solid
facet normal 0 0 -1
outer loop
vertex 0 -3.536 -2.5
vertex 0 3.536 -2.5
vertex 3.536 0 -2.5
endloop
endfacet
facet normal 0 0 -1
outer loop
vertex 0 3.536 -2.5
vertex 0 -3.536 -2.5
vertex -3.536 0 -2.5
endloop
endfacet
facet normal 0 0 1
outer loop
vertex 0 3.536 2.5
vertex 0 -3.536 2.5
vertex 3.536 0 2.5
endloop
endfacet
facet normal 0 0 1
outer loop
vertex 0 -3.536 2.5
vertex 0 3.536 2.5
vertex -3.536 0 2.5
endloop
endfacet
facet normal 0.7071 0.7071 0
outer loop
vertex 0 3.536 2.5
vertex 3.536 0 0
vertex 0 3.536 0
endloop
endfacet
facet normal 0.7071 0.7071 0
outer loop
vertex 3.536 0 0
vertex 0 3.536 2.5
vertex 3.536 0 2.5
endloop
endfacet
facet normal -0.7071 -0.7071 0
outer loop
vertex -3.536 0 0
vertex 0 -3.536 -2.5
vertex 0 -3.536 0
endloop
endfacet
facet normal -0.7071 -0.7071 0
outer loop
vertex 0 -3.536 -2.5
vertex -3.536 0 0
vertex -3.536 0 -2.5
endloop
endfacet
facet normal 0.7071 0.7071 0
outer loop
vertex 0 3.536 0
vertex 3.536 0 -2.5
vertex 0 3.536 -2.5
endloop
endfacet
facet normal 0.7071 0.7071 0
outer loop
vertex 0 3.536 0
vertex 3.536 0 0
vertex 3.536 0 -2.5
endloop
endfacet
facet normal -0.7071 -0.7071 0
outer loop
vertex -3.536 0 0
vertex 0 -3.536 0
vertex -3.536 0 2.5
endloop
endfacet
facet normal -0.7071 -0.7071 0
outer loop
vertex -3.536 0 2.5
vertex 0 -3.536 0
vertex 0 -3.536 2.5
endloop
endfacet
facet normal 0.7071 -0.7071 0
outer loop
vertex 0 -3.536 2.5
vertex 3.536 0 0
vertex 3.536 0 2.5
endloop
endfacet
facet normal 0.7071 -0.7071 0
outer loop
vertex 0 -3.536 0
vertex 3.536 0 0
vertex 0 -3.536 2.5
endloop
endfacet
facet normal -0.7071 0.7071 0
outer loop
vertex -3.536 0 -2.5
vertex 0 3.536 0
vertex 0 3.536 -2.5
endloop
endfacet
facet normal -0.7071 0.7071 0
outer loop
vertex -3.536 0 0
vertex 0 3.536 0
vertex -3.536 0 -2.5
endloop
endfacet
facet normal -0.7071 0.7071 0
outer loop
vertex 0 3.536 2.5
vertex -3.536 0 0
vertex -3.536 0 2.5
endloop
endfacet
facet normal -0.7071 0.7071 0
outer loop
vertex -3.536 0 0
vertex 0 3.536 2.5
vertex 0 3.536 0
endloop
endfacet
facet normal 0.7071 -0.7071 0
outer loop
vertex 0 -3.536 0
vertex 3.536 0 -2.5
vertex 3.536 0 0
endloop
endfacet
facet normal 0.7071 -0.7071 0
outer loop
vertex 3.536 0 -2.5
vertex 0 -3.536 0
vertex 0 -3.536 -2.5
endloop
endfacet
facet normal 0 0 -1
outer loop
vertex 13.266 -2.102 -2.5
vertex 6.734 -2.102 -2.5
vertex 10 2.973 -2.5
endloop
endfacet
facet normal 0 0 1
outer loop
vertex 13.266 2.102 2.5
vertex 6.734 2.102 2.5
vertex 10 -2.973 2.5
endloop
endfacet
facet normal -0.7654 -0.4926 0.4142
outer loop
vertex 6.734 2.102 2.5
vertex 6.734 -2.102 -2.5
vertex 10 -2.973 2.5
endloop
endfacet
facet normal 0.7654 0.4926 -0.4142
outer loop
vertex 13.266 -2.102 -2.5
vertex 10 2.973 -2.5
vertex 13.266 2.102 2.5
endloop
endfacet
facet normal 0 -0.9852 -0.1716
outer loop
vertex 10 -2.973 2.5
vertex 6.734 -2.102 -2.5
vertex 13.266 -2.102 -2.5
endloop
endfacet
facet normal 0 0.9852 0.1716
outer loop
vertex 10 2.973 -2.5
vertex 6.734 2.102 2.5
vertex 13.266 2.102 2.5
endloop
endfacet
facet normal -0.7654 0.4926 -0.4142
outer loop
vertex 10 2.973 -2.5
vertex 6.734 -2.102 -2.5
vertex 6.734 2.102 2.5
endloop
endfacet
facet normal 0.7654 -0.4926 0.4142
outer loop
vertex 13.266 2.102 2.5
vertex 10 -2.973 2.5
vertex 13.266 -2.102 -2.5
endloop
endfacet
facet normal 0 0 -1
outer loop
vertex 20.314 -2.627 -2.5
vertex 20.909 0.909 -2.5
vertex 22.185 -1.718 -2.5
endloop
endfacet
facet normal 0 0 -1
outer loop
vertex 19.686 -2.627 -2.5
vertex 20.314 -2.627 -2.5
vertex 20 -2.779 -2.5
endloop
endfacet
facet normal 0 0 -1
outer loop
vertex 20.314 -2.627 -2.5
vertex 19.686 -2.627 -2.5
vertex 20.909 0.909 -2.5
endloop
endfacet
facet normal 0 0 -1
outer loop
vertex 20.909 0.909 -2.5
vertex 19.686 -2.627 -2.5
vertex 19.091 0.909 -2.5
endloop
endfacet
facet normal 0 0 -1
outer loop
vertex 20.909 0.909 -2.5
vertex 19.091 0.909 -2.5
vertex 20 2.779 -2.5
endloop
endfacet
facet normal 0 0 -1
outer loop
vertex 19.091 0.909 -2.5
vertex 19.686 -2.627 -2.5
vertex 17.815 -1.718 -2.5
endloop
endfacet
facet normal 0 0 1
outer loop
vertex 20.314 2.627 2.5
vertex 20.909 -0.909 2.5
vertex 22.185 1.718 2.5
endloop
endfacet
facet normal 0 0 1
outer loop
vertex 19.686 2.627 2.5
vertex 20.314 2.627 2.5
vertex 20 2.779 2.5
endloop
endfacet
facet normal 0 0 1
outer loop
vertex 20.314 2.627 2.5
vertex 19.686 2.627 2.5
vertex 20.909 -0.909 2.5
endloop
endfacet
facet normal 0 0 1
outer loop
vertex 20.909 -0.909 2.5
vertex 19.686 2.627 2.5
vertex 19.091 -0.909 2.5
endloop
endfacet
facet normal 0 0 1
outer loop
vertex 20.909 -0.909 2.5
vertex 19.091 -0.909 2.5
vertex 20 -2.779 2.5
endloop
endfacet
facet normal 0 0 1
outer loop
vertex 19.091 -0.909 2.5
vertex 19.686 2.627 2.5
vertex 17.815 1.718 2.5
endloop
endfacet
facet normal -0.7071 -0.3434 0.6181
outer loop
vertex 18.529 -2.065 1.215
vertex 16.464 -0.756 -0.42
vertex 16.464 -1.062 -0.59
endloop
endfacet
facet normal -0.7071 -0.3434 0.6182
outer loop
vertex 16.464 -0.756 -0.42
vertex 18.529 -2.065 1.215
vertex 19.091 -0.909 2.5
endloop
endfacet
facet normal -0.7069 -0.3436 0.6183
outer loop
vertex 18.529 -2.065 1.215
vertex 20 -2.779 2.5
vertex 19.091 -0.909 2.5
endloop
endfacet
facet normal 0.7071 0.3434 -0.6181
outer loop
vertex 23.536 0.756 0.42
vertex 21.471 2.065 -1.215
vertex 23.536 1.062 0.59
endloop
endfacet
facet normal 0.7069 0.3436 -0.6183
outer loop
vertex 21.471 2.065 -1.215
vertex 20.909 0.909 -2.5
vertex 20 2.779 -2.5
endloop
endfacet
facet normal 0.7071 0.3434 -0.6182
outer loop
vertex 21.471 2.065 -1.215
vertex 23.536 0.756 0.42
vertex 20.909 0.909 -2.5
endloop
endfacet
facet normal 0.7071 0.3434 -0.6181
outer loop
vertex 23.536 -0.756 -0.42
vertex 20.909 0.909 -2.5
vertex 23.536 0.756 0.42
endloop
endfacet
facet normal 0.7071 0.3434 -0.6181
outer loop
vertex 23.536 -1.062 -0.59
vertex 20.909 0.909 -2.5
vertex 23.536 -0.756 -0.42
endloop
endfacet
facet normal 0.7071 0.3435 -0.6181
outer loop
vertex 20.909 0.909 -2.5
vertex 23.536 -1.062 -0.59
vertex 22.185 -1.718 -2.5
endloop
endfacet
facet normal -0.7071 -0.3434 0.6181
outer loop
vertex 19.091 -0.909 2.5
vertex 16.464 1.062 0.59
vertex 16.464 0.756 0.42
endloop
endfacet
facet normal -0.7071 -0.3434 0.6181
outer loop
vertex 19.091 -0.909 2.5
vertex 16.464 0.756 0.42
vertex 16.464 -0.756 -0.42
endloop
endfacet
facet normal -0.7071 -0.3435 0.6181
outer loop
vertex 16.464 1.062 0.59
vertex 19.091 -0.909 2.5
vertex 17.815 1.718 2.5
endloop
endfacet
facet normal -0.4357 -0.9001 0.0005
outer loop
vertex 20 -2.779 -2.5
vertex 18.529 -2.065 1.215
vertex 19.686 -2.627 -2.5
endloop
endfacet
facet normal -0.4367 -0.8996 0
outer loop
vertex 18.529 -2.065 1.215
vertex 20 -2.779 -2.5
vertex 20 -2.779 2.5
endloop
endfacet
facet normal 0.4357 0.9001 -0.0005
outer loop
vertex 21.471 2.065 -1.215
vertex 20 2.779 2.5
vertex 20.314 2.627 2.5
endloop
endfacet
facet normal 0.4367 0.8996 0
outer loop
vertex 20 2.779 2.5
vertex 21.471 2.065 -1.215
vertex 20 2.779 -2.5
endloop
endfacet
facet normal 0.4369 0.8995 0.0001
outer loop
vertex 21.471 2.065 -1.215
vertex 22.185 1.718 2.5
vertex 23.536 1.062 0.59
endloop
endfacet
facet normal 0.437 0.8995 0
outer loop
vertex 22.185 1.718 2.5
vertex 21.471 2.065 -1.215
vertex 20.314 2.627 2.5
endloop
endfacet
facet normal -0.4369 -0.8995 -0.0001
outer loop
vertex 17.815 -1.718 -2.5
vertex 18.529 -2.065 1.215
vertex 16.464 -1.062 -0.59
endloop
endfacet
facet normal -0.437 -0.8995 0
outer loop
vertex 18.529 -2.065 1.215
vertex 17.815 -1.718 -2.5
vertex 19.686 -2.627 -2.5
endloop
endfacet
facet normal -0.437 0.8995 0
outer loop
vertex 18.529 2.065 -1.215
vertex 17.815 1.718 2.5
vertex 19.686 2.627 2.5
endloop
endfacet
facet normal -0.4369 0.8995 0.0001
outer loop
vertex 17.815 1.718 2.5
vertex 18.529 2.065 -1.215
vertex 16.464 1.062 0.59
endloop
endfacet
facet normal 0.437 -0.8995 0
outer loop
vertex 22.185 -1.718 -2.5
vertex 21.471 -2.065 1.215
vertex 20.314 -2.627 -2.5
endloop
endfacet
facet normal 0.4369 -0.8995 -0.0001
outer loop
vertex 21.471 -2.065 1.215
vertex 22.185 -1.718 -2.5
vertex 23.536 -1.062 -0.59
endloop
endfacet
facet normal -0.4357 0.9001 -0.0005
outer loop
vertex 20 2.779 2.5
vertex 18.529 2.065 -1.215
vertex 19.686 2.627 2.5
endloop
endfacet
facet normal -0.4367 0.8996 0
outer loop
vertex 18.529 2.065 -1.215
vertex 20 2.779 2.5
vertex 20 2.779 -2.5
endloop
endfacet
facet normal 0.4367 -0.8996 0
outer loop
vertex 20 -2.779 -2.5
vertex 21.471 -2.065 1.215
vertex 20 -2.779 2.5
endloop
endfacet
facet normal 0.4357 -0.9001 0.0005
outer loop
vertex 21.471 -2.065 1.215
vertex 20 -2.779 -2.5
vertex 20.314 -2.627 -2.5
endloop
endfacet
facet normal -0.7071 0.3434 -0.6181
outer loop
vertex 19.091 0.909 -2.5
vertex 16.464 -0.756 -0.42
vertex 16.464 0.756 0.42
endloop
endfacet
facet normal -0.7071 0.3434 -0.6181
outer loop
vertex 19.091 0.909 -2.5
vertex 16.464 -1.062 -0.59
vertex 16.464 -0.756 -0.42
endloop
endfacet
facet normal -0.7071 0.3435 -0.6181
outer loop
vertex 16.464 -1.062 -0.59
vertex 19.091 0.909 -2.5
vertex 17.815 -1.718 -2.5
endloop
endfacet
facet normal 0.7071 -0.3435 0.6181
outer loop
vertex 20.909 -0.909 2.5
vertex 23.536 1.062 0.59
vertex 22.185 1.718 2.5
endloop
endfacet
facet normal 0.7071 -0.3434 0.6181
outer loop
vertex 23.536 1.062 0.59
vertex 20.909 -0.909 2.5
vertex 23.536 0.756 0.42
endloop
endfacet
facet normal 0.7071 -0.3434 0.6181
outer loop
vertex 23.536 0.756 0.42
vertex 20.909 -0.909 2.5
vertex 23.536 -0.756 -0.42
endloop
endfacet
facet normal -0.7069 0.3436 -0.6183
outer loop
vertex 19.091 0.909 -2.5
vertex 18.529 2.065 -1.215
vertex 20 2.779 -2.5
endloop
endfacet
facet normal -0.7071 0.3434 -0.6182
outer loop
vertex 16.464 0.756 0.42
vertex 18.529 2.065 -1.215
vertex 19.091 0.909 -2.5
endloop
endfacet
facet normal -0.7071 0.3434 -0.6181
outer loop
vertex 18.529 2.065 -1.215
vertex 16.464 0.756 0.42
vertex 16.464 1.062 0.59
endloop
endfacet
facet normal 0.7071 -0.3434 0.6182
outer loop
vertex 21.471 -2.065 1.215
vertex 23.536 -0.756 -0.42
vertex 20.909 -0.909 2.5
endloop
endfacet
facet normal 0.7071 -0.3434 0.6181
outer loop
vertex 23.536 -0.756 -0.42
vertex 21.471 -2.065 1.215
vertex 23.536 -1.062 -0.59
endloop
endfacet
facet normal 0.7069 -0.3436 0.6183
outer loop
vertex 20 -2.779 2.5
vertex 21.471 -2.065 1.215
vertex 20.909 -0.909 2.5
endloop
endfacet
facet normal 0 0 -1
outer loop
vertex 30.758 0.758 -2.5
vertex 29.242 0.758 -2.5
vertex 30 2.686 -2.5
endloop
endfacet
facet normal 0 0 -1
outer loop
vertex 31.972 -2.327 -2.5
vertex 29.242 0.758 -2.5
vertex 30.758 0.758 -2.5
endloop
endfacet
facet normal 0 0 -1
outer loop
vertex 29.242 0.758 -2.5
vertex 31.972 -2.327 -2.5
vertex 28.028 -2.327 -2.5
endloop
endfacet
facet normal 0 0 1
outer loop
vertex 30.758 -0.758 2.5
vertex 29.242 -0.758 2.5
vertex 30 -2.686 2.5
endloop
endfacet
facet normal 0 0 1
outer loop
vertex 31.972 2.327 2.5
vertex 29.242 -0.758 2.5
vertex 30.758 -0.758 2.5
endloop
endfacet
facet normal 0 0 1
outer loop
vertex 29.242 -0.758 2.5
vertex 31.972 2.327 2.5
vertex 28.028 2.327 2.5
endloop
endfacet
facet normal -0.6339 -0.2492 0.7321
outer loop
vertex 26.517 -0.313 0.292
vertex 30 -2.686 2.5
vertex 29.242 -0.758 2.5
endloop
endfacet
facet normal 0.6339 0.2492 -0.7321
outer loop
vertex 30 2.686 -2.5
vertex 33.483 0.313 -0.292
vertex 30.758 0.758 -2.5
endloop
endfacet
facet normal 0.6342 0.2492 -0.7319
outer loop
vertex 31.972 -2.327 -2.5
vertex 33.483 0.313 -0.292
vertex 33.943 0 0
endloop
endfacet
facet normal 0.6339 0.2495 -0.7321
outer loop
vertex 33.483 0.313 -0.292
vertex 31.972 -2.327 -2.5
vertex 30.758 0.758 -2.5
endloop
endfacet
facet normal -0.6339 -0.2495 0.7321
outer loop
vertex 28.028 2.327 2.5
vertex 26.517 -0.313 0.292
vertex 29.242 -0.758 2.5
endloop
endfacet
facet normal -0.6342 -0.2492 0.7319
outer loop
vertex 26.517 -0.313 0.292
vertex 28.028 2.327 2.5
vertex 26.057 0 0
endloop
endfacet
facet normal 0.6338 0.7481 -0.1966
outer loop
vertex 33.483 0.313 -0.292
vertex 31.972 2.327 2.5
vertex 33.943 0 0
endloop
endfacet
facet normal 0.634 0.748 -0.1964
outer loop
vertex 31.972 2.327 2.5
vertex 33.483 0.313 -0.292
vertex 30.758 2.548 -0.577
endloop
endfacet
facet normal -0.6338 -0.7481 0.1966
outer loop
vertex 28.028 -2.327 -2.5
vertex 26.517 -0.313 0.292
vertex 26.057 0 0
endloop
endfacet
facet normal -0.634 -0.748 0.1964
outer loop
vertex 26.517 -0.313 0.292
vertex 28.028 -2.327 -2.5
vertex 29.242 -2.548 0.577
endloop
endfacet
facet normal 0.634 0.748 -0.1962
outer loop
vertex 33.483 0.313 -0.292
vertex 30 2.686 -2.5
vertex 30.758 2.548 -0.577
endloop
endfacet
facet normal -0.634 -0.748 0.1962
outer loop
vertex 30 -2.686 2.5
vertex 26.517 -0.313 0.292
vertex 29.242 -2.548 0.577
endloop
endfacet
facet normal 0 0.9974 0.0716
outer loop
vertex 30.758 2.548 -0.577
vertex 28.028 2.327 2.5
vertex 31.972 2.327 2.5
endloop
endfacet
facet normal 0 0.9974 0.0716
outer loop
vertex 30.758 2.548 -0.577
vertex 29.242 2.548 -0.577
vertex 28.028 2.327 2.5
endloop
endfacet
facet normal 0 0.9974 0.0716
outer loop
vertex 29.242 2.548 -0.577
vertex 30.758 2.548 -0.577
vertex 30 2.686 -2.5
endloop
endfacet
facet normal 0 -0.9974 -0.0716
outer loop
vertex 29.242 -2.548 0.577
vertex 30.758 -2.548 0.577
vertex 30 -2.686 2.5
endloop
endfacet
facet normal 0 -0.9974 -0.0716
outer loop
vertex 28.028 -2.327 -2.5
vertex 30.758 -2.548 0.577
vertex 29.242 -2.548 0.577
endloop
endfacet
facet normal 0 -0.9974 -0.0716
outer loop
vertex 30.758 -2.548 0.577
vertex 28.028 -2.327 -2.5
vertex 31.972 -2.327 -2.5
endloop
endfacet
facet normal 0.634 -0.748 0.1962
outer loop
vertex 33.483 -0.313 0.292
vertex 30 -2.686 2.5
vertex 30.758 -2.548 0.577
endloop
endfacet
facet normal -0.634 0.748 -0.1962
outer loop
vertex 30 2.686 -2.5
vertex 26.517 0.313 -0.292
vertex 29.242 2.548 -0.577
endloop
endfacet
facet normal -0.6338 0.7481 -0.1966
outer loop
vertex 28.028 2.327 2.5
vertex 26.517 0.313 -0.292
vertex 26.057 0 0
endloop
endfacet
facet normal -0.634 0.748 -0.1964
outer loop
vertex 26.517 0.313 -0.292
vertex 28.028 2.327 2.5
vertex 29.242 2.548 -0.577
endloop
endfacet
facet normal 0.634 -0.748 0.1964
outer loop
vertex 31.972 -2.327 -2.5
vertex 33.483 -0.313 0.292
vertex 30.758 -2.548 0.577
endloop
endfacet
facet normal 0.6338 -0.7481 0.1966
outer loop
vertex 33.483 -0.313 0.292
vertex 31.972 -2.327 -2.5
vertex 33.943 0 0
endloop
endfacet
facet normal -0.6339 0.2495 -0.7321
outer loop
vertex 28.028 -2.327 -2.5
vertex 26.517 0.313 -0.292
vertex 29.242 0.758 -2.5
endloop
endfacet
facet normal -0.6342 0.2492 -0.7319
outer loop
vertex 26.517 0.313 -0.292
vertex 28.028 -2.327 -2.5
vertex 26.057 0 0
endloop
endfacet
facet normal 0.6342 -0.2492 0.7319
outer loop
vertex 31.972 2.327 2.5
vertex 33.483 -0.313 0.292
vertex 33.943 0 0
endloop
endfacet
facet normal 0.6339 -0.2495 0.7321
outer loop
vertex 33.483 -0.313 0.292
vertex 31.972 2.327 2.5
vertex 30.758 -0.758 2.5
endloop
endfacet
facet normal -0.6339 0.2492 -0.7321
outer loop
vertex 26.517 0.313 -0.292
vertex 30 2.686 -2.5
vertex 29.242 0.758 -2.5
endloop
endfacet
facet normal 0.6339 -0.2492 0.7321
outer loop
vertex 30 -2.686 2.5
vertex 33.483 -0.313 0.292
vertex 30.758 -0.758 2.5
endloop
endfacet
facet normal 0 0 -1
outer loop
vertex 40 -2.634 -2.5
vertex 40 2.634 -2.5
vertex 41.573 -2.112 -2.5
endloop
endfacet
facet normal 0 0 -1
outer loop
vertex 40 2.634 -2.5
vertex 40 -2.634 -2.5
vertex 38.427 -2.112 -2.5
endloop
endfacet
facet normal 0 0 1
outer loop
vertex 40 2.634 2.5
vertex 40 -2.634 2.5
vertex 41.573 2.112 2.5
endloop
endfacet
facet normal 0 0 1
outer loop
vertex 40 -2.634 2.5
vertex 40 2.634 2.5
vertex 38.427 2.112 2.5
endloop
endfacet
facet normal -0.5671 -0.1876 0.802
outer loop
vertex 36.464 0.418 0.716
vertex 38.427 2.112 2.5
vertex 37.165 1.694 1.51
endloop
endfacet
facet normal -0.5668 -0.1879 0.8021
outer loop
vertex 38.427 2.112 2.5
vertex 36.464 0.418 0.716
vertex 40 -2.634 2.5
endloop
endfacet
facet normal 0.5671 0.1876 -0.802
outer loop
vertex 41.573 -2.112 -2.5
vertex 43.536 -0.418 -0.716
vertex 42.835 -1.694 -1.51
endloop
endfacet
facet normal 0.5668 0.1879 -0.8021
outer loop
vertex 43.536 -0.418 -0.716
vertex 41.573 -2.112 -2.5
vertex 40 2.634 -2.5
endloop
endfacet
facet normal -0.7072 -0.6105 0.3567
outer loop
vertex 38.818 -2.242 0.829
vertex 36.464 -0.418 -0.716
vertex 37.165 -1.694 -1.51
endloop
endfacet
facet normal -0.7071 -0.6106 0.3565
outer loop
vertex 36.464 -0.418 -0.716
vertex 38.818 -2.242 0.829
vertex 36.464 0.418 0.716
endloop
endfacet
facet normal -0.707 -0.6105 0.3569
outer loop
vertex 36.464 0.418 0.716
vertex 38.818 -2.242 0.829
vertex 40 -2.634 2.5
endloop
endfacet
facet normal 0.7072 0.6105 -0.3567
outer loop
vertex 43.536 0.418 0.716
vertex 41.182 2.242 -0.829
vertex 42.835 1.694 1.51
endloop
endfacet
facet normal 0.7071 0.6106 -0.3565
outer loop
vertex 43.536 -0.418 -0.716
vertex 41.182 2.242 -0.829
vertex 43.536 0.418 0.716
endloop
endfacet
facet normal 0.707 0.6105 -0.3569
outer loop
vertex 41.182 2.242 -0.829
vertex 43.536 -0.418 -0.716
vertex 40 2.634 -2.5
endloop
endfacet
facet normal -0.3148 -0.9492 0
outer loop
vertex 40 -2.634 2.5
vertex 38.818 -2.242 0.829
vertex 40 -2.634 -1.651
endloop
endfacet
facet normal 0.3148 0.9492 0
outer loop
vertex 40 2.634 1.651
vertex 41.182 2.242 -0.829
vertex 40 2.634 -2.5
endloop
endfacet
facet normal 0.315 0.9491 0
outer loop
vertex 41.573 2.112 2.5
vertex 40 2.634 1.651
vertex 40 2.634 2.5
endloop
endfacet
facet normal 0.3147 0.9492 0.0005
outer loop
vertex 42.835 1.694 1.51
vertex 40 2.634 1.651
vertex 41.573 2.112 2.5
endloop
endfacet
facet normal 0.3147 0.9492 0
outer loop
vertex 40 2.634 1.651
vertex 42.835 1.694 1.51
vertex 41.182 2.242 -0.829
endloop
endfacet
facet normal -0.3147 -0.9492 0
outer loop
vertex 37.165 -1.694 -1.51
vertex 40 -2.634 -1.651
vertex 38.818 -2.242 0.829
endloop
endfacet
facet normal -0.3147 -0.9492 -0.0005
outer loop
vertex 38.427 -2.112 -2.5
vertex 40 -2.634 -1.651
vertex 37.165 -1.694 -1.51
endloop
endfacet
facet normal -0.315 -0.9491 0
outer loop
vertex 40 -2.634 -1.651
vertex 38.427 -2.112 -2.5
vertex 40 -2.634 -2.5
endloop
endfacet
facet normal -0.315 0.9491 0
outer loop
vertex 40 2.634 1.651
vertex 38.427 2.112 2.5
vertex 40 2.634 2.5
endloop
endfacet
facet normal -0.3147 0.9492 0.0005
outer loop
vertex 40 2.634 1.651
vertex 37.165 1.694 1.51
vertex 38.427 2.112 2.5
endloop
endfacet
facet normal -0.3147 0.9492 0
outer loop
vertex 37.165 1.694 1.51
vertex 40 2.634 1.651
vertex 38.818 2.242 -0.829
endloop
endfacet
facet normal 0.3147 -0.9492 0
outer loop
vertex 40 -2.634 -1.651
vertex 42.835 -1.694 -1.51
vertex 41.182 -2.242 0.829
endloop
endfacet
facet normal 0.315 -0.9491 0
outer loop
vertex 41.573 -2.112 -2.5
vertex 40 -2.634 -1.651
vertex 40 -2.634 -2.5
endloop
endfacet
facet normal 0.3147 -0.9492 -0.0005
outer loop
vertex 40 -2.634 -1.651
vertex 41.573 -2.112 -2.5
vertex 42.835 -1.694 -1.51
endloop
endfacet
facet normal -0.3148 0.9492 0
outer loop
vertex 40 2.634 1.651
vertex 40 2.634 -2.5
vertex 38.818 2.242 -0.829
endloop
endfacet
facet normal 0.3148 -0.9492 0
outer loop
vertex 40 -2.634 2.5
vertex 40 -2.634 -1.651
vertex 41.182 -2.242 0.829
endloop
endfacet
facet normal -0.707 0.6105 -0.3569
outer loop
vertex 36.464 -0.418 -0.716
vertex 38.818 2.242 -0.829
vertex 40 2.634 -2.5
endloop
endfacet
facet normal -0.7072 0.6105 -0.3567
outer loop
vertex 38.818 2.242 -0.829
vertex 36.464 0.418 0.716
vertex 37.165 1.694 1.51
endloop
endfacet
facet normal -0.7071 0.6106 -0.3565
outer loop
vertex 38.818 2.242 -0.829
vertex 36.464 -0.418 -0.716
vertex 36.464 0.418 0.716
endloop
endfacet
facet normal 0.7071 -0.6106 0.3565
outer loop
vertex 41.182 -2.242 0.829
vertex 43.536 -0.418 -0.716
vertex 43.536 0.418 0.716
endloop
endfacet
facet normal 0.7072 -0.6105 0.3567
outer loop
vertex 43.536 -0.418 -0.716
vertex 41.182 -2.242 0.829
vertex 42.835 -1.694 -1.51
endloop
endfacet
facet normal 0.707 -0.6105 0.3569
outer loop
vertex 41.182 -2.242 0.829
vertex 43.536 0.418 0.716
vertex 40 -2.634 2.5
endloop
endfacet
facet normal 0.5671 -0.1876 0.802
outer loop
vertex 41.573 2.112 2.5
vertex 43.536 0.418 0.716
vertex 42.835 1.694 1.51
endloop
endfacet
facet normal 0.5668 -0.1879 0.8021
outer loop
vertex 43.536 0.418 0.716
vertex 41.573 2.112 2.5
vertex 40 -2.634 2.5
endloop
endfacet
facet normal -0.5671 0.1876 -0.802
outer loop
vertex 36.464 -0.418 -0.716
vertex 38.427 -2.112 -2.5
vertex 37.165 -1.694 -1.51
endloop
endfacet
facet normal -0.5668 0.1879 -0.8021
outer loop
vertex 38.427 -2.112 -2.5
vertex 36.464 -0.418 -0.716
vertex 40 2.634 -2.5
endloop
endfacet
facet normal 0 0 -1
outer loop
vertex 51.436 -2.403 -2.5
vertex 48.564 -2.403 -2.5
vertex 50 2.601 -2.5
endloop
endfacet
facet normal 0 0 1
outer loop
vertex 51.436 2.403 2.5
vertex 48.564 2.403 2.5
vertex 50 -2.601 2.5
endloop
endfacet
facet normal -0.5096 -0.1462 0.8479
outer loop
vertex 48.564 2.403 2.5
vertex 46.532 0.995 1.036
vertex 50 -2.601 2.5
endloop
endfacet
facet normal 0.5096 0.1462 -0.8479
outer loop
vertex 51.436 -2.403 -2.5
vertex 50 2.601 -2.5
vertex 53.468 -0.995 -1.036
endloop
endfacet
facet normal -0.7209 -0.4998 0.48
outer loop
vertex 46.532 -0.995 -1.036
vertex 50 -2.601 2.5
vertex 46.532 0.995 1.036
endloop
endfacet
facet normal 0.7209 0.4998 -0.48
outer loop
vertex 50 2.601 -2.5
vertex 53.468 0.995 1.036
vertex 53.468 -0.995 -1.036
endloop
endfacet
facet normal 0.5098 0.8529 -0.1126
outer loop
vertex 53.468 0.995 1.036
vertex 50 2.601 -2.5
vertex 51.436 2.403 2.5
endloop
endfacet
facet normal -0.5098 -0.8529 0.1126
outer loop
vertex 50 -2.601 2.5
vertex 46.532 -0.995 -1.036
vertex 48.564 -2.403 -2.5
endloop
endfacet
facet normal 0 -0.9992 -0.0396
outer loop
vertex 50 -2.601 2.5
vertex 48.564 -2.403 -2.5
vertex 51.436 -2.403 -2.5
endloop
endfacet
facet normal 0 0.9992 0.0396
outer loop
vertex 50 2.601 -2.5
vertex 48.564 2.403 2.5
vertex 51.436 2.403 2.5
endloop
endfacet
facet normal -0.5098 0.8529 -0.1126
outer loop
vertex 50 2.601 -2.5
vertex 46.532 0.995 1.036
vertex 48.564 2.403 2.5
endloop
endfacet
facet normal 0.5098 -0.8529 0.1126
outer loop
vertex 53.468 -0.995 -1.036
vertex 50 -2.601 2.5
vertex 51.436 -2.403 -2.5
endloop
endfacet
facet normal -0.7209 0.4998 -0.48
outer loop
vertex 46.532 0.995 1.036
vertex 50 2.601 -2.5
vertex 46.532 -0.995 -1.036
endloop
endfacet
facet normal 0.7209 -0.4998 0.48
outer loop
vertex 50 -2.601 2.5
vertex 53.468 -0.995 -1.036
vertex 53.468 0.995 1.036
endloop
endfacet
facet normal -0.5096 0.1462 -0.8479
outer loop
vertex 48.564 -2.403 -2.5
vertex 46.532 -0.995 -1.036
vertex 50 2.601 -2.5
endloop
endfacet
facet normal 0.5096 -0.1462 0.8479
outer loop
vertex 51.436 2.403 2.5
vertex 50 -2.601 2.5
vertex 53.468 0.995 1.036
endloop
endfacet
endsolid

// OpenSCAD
// 2 * 5 = 10面体骰子
module item(w=10,d=45,p=0){
    rotate([d,0,p])
        cube([w*2,w,w*2],center=true);
}

module dice_2n(n=5,w=10){
    p=360/n;
    d=90-atan(sqrt(1/cos(p/2)));
    rotate([90-d,0,0])
    intersection_for (a = [ 0 : (n-1) ])
        item(w,d,p*a);
}

w=5;
n=3;
for(a=[n:8]){
    translate([(a-n)*2*w,0,0])
        dice_2n(a,w);
}
//item(50,0,0);
